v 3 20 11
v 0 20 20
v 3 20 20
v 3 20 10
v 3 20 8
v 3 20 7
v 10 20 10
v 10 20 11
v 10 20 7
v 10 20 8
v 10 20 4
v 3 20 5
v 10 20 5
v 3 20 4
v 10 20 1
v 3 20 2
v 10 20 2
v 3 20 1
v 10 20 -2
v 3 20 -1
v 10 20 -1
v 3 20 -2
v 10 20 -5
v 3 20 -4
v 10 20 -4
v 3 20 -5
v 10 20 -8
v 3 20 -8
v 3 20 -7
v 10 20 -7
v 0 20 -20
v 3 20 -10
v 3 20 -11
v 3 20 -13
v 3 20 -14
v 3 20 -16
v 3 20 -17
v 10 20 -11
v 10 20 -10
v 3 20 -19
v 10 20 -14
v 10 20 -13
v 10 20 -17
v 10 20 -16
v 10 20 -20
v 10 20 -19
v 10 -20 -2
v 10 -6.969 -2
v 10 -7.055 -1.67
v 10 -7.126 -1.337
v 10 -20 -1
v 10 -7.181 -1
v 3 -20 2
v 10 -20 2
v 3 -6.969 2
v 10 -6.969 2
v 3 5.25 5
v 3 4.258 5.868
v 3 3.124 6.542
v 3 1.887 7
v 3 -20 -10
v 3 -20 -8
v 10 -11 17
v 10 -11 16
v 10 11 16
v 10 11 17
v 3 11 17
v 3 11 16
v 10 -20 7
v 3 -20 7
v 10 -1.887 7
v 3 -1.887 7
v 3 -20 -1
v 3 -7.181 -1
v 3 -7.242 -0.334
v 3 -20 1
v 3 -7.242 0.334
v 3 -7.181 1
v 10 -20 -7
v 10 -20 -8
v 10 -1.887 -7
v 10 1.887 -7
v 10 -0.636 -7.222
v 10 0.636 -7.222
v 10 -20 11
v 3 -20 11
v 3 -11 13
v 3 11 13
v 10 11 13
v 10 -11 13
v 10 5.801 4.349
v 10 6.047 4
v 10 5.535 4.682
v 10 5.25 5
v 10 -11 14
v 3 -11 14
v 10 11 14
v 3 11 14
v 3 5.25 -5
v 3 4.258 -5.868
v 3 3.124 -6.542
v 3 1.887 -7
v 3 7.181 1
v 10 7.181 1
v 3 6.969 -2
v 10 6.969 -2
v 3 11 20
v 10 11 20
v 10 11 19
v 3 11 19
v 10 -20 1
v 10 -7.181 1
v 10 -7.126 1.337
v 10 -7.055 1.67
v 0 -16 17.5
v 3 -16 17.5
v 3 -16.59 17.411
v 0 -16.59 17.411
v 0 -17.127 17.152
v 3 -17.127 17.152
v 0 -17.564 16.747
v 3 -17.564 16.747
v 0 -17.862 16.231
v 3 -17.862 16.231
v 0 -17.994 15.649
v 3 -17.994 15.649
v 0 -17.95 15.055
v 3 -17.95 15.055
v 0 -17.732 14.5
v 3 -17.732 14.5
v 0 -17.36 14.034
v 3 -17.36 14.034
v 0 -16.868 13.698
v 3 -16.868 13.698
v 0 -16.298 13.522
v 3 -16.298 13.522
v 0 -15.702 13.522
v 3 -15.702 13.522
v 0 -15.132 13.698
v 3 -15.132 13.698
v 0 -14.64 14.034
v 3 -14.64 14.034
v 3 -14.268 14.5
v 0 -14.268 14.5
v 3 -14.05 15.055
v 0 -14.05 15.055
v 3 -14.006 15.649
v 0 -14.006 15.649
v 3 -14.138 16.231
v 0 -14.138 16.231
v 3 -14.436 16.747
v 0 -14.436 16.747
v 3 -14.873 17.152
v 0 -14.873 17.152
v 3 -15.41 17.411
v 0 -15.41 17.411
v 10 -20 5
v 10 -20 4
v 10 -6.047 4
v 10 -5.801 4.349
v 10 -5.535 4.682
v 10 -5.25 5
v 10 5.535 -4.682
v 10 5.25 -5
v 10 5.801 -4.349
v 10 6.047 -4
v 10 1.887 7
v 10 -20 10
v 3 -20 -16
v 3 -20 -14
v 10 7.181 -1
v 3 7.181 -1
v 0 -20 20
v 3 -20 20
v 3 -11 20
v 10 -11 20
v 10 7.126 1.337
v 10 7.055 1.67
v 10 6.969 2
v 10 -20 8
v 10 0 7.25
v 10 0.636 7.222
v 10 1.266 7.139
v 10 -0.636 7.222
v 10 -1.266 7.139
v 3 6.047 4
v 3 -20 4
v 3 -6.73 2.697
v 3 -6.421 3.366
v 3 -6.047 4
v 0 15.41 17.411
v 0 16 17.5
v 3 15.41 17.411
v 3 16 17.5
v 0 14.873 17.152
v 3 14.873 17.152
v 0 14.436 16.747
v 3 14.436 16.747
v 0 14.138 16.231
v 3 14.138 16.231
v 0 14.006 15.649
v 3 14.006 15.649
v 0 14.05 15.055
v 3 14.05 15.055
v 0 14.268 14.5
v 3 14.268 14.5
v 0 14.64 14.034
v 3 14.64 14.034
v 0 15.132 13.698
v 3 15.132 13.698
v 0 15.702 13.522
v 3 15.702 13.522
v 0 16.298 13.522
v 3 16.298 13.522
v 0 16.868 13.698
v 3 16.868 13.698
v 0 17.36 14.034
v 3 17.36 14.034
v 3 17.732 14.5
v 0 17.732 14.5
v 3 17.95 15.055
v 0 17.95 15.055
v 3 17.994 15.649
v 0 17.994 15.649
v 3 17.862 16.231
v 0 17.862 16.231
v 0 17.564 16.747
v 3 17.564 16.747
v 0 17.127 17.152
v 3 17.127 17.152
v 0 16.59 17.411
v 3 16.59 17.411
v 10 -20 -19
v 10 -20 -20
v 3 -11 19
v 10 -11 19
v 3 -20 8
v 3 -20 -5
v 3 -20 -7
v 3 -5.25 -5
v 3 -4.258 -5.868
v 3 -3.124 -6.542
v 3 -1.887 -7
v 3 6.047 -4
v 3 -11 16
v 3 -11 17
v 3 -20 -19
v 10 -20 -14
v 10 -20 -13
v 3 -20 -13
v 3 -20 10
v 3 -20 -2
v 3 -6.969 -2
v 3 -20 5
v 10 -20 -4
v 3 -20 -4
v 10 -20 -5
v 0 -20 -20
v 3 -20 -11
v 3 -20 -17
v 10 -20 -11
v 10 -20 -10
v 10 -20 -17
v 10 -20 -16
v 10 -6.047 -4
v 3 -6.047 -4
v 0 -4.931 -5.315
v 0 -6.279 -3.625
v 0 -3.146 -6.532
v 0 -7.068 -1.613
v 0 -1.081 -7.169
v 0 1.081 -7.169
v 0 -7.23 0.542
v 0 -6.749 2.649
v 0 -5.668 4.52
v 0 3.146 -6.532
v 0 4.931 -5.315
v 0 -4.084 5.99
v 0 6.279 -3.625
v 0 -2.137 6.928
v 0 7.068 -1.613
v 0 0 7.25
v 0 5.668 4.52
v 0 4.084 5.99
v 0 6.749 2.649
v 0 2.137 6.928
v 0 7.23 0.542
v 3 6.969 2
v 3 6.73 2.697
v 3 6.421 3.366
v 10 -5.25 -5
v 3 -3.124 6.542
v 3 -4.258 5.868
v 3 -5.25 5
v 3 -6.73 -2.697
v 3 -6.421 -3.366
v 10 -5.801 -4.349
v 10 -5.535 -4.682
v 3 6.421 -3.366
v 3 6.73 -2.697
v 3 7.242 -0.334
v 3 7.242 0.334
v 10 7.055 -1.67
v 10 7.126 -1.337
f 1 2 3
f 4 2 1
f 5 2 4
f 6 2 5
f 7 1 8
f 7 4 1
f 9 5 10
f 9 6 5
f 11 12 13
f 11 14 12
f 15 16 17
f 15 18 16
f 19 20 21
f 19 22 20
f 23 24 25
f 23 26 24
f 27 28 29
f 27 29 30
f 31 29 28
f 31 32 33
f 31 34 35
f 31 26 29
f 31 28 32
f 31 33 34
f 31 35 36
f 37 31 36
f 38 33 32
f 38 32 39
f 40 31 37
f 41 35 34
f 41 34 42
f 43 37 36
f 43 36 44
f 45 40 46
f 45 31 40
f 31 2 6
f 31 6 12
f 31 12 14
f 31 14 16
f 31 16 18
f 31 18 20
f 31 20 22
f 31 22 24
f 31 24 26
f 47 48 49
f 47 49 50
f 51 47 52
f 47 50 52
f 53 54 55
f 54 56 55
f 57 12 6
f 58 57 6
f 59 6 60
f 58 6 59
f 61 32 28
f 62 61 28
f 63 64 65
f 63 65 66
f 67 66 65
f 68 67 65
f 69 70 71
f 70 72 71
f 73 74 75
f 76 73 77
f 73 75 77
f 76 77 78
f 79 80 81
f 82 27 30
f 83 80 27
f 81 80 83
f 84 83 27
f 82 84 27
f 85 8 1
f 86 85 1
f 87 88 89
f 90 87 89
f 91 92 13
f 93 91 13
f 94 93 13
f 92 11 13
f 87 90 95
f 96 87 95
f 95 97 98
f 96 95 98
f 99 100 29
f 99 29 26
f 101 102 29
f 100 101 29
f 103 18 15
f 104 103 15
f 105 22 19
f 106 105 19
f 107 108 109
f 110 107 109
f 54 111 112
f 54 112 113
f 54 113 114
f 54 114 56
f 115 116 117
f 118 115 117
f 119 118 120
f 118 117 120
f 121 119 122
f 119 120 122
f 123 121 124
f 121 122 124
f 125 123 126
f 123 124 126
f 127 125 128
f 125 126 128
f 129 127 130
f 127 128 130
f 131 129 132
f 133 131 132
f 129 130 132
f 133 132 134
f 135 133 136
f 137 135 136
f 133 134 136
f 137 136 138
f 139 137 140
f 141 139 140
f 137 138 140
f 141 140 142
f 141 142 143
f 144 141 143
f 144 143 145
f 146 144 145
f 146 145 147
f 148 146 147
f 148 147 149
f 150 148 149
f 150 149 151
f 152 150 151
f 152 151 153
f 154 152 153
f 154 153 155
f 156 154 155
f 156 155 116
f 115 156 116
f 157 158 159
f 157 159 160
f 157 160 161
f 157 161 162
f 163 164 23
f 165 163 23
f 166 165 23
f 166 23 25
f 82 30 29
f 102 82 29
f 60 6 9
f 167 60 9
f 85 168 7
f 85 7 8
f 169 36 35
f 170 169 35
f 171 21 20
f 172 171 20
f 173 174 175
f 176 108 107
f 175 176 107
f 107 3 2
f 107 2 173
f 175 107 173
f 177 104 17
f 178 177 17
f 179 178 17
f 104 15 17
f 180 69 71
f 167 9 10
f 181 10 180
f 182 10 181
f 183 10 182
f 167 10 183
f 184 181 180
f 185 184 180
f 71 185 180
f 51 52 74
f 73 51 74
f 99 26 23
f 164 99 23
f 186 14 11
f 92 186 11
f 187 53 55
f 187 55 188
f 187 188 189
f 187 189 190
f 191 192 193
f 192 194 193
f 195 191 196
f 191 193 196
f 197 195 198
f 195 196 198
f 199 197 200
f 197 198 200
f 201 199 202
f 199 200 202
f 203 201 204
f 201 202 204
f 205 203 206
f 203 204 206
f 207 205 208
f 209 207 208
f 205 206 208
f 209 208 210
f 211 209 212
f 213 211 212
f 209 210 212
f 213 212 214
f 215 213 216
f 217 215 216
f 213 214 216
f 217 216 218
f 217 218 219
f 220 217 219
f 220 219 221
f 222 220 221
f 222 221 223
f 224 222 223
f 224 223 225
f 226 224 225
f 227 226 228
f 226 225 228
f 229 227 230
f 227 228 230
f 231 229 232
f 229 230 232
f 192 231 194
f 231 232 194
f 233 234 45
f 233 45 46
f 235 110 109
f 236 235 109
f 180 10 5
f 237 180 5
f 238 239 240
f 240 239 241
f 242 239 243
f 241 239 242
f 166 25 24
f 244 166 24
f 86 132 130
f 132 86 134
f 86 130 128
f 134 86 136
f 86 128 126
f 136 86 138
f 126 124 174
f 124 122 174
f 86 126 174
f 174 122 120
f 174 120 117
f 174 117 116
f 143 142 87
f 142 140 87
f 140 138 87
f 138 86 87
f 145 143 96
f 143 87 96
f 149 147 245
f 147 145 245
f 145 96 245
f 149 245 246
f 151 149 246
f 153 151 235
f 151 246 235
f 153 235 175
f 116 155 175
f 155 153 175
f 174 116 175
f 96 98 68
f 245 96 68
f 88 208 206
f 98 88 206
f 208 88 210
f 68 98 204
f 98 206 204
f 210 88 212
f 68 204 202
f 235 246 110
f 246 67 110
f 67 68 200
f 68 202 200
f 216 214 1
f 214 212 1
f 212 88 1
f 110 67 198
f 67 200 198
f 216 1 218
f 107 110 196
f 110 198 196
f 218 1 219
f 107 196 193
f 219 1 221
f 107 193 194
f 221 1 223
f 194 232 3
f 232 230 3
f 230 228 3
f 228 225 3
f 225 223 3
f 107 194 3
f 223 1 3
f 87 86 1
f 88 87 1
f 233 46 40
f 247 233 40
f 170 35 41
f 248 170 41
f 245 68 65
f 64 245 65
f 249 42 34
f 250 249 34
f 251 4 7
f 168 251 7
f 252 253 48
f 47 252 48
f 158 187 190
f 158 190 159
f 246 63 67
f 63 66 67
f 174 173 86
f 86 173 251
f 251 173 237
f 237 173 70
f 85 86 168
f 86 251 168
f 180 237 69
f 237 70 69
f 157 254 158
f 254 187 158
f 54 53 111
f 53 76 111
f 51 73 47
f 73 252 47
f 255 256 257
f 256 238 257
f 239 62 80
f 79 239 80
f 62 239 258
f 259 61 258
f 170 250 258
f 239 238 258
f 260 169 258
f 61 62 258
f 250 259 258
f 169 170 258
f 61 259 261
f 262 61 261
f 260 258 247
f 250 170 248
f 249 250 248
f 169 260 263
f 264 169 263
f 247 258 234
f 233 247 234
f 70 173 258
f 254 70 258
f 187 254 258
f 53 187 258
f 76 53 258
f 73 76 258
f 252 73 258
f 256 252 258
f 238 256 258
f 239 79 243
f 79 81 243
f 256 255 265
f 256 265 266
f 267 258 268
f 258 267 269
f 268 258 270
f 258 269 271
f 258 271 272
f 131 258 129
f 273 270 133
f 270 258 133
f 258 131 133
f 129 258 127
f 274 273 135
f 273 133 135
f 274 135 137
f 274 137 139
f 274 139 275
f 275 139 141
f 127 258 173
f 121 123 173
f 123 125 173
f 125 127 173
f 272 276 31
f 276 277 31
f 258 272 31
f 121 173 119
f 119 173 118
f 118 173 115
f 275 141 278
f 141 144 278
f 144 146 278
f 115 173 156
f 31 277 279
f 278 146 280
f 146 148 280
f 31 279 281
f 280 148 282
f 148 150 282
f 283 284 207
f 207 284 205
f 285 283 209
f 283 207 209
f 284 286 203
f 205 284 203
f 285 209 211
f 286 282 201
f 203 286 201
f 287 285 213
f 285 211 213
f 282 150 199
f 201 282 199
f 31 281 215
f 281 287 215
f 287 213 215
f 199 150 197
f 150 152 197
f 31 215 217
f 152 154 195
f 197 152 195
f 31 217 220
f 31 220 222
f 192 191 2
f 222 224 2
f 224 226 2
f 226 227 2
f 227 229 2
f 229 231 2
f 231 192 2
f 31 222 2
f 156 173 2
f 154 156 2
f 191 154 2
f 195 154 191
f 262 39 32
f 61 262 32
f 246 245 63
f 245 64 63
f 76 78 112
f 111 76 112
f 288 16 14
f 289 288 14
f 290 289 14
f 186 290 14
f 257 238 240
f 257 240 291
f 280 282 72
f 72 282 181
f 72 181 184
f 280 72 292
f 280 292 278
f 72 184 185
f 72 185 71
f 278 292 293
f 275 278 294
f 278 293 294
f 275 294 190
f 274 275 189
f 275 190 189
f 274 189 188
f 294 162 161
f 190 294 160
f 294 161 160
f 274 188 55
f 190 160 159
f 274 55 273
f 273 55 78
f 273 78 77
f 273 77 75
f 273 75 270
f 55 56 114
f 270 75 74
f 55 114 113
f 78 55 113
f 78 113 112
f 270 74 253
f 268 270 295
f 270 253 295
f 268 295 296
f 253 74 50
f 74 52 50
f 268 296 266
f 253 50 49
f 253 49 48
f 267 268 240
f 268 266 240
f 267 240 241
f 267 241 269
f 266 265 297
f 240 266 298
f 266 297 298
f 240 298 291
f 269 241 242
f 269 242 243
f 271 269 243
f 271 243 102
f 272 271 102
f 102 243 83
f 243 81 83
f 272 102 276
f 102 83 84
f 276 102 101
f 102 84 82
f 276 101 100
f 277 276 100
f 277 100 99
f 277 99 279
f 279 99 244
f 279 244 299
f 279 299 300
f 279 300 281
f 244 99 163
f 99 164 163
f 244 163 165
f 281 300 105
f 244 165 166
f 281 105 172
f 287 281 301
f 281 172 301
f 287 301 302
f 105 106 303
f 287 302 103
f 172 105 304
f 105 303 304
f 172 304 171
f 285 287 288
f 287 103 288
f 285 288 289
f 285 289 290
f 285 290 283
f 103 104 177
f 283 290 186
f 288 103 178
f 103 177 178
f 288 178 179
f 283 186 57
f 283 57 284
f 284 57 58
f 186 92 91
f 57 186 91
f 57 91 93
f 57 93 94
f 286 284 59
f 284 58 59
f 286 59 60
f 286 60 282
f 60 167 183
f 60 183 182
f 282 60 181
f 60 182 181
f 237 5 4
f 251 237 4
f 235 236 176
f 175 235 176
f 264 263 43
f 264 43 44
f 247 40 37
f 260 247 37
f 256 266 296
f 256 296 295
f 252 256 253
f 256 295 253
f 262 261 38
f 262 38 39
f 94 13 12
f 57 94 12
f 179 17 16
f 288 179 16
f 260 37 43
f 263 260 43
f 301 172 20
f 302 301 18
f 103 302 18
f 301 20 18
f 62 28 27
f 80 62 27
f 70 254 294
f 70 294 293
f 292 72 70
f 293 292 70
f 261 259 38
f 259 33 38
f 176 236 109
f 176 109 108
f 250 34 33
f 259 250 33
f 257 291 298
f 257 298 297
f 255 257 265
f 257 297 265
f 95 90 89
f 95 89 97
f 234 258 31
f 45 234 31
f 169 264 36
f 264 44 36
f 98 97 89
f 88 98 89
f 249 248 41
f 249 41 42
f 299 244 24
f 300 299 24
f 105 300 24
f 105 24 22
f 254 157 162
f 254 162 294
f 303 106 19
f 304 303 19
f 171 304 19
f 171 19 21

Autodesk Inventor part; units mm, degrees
ref_plane "YZ Plane" through (0, 0, 0) normal (1, 0, 0) x (0, 1, 0)
ref_plane "XZ Plane" through (0, 0, 0) normal (0, 1, 0) x (-1, 0, 0)
ref_plane "XY Plane" through (0, 0, 0) normal (0, 0, 1) x (1, 0, 0)
sketch "Szkic1" plane through (0, 0, 0) normal (1, 0, 0) x (0, 1, 0)
  line L0 (20, 20) -> (-20, 20)
  line L1 (-20, 20) -> (-20, -20)
  line L2 (-20, -20) -> (20, -20)
  line L3 (20, -20) -> (20, 20)
  line L4 (20, 0) -> (0, 0) construction
  line L5 (0, 0) -> (0, -20) construction
  dimension "d0" = 40
  dimension "d1" = 40
extrude "Wyciągnięcie proste1" add sketch "Szkic1" along normal blind 2
sketch "Szkic4" plane through (0, 20, 20) normal (0, 1, 0) x (1, 0, 0)
  line L0 (0, 40) -> (2, 40) projected
  line L1 (2, 40) -> (10, 40)
  line L2 (10, 40) -> (10, 39)
  line L3 (10, 39) -> (3, 39)
  line L4 (3, 39) -> (3, 37)
  line L5 (3, 37) -> (2, 37)
  line L6 (2, 40) -> (2, 37)
  line L7 (2, 0) -> (2, 40) projected
  point P0 (0, 20)
  dimension "d27" = 8
  dimension "d29" = 2
  dimension "d30" = 1
  dimension "d31" = 1
extrude "Wyciągnięcie proste2" add sketch "Szkic4" against normal up to surface (40 mm away)
pattern_linear "Szyk prostokątny1" count 13 spacing 3 along (0, 0, 1) of "Wyciągnięcie proste2"
sketch "Szkic5" plane through (0, 20, 20) normal (0, 1, 0) x (1, 0, 0)
  line L0 (2, 1) -> (2, 0) projected
  line L1 (2, 1) -> (10, 1)
  line L2 (10, 1) -> (10, 0)
  line L3 (10, 0) -> (2, 0)
  line L4 (2, 0) -> (2, 1)
  line L5 (10, 3) -> (10, 4) projected
  line L6 (0, 0) -> (2, 0) projected
  point P0 (0, 20)
  point P1 (1, 0)
extrude "Wyciągnięcie proste3" add sketch "Szkic5" against normal up to surface (40 mm away)
sketch "Szkic6" plane through (0, 0, 0) normal (-1, 0, 0) x (0, 0, 1)
  point P0 (0, 0)
  point P1 (0, 0)
hole "Otwór1" at (0, 0, 0) direction (1, 0, 0) diameter 14.5 end through all
sketch "Szkic7" plane through (0, 0, 0) normal (-1, 0, 0) x (0, 0, 1)
  line L0 (0, 0) -> (-20, 0) construction
  line L1 (-20, -20) -> (-20, 20) projected
  line L2 (20, 20) -> (20, -20) projected
  point P0 (15.5, -16)
  point P1 (15.5, 16)
  dimension "d46" = 32
  dimension "d47" = 4.5
hole "Otwór2" at (0, -16, 15.5) at (0, 16, 15.5) direction (1, 0, 0) diameter 4 end through all
sketch "Szkic8" plane through (10, 20, 20) normal (1, 0, 0) x (0, 0, -1)
  line L0 (0, 0) -> (0, -40) projected
  line L1 (7, 0) -> (0, 0)
  line L2 (0, 0) -> (0, -9)
  line L3 (0, -9) -> (7, -9)
  line L4 (7, -9) -> (7, 0)
  line L5 (7, 0) -> (7, -40) projected
  line L6 (0, -40) -> (7, -40)
  line L7 (7, -40) -> (7, -31)
  line L8 (7, -31) -> (0, -31)
  line L9 (0, -31) -> (0, -40)
  point P0 (20, -20)
  dimension "d56" = 9
  dimension "d57" = 9
extrude "Wyciągnięcie proste4" cut sketch "Szkic8" against normal up to surface (7 mm away) contours L1 L4 L3 L0 | L8 L5 L6 L0
properties part number "36_radiator"
